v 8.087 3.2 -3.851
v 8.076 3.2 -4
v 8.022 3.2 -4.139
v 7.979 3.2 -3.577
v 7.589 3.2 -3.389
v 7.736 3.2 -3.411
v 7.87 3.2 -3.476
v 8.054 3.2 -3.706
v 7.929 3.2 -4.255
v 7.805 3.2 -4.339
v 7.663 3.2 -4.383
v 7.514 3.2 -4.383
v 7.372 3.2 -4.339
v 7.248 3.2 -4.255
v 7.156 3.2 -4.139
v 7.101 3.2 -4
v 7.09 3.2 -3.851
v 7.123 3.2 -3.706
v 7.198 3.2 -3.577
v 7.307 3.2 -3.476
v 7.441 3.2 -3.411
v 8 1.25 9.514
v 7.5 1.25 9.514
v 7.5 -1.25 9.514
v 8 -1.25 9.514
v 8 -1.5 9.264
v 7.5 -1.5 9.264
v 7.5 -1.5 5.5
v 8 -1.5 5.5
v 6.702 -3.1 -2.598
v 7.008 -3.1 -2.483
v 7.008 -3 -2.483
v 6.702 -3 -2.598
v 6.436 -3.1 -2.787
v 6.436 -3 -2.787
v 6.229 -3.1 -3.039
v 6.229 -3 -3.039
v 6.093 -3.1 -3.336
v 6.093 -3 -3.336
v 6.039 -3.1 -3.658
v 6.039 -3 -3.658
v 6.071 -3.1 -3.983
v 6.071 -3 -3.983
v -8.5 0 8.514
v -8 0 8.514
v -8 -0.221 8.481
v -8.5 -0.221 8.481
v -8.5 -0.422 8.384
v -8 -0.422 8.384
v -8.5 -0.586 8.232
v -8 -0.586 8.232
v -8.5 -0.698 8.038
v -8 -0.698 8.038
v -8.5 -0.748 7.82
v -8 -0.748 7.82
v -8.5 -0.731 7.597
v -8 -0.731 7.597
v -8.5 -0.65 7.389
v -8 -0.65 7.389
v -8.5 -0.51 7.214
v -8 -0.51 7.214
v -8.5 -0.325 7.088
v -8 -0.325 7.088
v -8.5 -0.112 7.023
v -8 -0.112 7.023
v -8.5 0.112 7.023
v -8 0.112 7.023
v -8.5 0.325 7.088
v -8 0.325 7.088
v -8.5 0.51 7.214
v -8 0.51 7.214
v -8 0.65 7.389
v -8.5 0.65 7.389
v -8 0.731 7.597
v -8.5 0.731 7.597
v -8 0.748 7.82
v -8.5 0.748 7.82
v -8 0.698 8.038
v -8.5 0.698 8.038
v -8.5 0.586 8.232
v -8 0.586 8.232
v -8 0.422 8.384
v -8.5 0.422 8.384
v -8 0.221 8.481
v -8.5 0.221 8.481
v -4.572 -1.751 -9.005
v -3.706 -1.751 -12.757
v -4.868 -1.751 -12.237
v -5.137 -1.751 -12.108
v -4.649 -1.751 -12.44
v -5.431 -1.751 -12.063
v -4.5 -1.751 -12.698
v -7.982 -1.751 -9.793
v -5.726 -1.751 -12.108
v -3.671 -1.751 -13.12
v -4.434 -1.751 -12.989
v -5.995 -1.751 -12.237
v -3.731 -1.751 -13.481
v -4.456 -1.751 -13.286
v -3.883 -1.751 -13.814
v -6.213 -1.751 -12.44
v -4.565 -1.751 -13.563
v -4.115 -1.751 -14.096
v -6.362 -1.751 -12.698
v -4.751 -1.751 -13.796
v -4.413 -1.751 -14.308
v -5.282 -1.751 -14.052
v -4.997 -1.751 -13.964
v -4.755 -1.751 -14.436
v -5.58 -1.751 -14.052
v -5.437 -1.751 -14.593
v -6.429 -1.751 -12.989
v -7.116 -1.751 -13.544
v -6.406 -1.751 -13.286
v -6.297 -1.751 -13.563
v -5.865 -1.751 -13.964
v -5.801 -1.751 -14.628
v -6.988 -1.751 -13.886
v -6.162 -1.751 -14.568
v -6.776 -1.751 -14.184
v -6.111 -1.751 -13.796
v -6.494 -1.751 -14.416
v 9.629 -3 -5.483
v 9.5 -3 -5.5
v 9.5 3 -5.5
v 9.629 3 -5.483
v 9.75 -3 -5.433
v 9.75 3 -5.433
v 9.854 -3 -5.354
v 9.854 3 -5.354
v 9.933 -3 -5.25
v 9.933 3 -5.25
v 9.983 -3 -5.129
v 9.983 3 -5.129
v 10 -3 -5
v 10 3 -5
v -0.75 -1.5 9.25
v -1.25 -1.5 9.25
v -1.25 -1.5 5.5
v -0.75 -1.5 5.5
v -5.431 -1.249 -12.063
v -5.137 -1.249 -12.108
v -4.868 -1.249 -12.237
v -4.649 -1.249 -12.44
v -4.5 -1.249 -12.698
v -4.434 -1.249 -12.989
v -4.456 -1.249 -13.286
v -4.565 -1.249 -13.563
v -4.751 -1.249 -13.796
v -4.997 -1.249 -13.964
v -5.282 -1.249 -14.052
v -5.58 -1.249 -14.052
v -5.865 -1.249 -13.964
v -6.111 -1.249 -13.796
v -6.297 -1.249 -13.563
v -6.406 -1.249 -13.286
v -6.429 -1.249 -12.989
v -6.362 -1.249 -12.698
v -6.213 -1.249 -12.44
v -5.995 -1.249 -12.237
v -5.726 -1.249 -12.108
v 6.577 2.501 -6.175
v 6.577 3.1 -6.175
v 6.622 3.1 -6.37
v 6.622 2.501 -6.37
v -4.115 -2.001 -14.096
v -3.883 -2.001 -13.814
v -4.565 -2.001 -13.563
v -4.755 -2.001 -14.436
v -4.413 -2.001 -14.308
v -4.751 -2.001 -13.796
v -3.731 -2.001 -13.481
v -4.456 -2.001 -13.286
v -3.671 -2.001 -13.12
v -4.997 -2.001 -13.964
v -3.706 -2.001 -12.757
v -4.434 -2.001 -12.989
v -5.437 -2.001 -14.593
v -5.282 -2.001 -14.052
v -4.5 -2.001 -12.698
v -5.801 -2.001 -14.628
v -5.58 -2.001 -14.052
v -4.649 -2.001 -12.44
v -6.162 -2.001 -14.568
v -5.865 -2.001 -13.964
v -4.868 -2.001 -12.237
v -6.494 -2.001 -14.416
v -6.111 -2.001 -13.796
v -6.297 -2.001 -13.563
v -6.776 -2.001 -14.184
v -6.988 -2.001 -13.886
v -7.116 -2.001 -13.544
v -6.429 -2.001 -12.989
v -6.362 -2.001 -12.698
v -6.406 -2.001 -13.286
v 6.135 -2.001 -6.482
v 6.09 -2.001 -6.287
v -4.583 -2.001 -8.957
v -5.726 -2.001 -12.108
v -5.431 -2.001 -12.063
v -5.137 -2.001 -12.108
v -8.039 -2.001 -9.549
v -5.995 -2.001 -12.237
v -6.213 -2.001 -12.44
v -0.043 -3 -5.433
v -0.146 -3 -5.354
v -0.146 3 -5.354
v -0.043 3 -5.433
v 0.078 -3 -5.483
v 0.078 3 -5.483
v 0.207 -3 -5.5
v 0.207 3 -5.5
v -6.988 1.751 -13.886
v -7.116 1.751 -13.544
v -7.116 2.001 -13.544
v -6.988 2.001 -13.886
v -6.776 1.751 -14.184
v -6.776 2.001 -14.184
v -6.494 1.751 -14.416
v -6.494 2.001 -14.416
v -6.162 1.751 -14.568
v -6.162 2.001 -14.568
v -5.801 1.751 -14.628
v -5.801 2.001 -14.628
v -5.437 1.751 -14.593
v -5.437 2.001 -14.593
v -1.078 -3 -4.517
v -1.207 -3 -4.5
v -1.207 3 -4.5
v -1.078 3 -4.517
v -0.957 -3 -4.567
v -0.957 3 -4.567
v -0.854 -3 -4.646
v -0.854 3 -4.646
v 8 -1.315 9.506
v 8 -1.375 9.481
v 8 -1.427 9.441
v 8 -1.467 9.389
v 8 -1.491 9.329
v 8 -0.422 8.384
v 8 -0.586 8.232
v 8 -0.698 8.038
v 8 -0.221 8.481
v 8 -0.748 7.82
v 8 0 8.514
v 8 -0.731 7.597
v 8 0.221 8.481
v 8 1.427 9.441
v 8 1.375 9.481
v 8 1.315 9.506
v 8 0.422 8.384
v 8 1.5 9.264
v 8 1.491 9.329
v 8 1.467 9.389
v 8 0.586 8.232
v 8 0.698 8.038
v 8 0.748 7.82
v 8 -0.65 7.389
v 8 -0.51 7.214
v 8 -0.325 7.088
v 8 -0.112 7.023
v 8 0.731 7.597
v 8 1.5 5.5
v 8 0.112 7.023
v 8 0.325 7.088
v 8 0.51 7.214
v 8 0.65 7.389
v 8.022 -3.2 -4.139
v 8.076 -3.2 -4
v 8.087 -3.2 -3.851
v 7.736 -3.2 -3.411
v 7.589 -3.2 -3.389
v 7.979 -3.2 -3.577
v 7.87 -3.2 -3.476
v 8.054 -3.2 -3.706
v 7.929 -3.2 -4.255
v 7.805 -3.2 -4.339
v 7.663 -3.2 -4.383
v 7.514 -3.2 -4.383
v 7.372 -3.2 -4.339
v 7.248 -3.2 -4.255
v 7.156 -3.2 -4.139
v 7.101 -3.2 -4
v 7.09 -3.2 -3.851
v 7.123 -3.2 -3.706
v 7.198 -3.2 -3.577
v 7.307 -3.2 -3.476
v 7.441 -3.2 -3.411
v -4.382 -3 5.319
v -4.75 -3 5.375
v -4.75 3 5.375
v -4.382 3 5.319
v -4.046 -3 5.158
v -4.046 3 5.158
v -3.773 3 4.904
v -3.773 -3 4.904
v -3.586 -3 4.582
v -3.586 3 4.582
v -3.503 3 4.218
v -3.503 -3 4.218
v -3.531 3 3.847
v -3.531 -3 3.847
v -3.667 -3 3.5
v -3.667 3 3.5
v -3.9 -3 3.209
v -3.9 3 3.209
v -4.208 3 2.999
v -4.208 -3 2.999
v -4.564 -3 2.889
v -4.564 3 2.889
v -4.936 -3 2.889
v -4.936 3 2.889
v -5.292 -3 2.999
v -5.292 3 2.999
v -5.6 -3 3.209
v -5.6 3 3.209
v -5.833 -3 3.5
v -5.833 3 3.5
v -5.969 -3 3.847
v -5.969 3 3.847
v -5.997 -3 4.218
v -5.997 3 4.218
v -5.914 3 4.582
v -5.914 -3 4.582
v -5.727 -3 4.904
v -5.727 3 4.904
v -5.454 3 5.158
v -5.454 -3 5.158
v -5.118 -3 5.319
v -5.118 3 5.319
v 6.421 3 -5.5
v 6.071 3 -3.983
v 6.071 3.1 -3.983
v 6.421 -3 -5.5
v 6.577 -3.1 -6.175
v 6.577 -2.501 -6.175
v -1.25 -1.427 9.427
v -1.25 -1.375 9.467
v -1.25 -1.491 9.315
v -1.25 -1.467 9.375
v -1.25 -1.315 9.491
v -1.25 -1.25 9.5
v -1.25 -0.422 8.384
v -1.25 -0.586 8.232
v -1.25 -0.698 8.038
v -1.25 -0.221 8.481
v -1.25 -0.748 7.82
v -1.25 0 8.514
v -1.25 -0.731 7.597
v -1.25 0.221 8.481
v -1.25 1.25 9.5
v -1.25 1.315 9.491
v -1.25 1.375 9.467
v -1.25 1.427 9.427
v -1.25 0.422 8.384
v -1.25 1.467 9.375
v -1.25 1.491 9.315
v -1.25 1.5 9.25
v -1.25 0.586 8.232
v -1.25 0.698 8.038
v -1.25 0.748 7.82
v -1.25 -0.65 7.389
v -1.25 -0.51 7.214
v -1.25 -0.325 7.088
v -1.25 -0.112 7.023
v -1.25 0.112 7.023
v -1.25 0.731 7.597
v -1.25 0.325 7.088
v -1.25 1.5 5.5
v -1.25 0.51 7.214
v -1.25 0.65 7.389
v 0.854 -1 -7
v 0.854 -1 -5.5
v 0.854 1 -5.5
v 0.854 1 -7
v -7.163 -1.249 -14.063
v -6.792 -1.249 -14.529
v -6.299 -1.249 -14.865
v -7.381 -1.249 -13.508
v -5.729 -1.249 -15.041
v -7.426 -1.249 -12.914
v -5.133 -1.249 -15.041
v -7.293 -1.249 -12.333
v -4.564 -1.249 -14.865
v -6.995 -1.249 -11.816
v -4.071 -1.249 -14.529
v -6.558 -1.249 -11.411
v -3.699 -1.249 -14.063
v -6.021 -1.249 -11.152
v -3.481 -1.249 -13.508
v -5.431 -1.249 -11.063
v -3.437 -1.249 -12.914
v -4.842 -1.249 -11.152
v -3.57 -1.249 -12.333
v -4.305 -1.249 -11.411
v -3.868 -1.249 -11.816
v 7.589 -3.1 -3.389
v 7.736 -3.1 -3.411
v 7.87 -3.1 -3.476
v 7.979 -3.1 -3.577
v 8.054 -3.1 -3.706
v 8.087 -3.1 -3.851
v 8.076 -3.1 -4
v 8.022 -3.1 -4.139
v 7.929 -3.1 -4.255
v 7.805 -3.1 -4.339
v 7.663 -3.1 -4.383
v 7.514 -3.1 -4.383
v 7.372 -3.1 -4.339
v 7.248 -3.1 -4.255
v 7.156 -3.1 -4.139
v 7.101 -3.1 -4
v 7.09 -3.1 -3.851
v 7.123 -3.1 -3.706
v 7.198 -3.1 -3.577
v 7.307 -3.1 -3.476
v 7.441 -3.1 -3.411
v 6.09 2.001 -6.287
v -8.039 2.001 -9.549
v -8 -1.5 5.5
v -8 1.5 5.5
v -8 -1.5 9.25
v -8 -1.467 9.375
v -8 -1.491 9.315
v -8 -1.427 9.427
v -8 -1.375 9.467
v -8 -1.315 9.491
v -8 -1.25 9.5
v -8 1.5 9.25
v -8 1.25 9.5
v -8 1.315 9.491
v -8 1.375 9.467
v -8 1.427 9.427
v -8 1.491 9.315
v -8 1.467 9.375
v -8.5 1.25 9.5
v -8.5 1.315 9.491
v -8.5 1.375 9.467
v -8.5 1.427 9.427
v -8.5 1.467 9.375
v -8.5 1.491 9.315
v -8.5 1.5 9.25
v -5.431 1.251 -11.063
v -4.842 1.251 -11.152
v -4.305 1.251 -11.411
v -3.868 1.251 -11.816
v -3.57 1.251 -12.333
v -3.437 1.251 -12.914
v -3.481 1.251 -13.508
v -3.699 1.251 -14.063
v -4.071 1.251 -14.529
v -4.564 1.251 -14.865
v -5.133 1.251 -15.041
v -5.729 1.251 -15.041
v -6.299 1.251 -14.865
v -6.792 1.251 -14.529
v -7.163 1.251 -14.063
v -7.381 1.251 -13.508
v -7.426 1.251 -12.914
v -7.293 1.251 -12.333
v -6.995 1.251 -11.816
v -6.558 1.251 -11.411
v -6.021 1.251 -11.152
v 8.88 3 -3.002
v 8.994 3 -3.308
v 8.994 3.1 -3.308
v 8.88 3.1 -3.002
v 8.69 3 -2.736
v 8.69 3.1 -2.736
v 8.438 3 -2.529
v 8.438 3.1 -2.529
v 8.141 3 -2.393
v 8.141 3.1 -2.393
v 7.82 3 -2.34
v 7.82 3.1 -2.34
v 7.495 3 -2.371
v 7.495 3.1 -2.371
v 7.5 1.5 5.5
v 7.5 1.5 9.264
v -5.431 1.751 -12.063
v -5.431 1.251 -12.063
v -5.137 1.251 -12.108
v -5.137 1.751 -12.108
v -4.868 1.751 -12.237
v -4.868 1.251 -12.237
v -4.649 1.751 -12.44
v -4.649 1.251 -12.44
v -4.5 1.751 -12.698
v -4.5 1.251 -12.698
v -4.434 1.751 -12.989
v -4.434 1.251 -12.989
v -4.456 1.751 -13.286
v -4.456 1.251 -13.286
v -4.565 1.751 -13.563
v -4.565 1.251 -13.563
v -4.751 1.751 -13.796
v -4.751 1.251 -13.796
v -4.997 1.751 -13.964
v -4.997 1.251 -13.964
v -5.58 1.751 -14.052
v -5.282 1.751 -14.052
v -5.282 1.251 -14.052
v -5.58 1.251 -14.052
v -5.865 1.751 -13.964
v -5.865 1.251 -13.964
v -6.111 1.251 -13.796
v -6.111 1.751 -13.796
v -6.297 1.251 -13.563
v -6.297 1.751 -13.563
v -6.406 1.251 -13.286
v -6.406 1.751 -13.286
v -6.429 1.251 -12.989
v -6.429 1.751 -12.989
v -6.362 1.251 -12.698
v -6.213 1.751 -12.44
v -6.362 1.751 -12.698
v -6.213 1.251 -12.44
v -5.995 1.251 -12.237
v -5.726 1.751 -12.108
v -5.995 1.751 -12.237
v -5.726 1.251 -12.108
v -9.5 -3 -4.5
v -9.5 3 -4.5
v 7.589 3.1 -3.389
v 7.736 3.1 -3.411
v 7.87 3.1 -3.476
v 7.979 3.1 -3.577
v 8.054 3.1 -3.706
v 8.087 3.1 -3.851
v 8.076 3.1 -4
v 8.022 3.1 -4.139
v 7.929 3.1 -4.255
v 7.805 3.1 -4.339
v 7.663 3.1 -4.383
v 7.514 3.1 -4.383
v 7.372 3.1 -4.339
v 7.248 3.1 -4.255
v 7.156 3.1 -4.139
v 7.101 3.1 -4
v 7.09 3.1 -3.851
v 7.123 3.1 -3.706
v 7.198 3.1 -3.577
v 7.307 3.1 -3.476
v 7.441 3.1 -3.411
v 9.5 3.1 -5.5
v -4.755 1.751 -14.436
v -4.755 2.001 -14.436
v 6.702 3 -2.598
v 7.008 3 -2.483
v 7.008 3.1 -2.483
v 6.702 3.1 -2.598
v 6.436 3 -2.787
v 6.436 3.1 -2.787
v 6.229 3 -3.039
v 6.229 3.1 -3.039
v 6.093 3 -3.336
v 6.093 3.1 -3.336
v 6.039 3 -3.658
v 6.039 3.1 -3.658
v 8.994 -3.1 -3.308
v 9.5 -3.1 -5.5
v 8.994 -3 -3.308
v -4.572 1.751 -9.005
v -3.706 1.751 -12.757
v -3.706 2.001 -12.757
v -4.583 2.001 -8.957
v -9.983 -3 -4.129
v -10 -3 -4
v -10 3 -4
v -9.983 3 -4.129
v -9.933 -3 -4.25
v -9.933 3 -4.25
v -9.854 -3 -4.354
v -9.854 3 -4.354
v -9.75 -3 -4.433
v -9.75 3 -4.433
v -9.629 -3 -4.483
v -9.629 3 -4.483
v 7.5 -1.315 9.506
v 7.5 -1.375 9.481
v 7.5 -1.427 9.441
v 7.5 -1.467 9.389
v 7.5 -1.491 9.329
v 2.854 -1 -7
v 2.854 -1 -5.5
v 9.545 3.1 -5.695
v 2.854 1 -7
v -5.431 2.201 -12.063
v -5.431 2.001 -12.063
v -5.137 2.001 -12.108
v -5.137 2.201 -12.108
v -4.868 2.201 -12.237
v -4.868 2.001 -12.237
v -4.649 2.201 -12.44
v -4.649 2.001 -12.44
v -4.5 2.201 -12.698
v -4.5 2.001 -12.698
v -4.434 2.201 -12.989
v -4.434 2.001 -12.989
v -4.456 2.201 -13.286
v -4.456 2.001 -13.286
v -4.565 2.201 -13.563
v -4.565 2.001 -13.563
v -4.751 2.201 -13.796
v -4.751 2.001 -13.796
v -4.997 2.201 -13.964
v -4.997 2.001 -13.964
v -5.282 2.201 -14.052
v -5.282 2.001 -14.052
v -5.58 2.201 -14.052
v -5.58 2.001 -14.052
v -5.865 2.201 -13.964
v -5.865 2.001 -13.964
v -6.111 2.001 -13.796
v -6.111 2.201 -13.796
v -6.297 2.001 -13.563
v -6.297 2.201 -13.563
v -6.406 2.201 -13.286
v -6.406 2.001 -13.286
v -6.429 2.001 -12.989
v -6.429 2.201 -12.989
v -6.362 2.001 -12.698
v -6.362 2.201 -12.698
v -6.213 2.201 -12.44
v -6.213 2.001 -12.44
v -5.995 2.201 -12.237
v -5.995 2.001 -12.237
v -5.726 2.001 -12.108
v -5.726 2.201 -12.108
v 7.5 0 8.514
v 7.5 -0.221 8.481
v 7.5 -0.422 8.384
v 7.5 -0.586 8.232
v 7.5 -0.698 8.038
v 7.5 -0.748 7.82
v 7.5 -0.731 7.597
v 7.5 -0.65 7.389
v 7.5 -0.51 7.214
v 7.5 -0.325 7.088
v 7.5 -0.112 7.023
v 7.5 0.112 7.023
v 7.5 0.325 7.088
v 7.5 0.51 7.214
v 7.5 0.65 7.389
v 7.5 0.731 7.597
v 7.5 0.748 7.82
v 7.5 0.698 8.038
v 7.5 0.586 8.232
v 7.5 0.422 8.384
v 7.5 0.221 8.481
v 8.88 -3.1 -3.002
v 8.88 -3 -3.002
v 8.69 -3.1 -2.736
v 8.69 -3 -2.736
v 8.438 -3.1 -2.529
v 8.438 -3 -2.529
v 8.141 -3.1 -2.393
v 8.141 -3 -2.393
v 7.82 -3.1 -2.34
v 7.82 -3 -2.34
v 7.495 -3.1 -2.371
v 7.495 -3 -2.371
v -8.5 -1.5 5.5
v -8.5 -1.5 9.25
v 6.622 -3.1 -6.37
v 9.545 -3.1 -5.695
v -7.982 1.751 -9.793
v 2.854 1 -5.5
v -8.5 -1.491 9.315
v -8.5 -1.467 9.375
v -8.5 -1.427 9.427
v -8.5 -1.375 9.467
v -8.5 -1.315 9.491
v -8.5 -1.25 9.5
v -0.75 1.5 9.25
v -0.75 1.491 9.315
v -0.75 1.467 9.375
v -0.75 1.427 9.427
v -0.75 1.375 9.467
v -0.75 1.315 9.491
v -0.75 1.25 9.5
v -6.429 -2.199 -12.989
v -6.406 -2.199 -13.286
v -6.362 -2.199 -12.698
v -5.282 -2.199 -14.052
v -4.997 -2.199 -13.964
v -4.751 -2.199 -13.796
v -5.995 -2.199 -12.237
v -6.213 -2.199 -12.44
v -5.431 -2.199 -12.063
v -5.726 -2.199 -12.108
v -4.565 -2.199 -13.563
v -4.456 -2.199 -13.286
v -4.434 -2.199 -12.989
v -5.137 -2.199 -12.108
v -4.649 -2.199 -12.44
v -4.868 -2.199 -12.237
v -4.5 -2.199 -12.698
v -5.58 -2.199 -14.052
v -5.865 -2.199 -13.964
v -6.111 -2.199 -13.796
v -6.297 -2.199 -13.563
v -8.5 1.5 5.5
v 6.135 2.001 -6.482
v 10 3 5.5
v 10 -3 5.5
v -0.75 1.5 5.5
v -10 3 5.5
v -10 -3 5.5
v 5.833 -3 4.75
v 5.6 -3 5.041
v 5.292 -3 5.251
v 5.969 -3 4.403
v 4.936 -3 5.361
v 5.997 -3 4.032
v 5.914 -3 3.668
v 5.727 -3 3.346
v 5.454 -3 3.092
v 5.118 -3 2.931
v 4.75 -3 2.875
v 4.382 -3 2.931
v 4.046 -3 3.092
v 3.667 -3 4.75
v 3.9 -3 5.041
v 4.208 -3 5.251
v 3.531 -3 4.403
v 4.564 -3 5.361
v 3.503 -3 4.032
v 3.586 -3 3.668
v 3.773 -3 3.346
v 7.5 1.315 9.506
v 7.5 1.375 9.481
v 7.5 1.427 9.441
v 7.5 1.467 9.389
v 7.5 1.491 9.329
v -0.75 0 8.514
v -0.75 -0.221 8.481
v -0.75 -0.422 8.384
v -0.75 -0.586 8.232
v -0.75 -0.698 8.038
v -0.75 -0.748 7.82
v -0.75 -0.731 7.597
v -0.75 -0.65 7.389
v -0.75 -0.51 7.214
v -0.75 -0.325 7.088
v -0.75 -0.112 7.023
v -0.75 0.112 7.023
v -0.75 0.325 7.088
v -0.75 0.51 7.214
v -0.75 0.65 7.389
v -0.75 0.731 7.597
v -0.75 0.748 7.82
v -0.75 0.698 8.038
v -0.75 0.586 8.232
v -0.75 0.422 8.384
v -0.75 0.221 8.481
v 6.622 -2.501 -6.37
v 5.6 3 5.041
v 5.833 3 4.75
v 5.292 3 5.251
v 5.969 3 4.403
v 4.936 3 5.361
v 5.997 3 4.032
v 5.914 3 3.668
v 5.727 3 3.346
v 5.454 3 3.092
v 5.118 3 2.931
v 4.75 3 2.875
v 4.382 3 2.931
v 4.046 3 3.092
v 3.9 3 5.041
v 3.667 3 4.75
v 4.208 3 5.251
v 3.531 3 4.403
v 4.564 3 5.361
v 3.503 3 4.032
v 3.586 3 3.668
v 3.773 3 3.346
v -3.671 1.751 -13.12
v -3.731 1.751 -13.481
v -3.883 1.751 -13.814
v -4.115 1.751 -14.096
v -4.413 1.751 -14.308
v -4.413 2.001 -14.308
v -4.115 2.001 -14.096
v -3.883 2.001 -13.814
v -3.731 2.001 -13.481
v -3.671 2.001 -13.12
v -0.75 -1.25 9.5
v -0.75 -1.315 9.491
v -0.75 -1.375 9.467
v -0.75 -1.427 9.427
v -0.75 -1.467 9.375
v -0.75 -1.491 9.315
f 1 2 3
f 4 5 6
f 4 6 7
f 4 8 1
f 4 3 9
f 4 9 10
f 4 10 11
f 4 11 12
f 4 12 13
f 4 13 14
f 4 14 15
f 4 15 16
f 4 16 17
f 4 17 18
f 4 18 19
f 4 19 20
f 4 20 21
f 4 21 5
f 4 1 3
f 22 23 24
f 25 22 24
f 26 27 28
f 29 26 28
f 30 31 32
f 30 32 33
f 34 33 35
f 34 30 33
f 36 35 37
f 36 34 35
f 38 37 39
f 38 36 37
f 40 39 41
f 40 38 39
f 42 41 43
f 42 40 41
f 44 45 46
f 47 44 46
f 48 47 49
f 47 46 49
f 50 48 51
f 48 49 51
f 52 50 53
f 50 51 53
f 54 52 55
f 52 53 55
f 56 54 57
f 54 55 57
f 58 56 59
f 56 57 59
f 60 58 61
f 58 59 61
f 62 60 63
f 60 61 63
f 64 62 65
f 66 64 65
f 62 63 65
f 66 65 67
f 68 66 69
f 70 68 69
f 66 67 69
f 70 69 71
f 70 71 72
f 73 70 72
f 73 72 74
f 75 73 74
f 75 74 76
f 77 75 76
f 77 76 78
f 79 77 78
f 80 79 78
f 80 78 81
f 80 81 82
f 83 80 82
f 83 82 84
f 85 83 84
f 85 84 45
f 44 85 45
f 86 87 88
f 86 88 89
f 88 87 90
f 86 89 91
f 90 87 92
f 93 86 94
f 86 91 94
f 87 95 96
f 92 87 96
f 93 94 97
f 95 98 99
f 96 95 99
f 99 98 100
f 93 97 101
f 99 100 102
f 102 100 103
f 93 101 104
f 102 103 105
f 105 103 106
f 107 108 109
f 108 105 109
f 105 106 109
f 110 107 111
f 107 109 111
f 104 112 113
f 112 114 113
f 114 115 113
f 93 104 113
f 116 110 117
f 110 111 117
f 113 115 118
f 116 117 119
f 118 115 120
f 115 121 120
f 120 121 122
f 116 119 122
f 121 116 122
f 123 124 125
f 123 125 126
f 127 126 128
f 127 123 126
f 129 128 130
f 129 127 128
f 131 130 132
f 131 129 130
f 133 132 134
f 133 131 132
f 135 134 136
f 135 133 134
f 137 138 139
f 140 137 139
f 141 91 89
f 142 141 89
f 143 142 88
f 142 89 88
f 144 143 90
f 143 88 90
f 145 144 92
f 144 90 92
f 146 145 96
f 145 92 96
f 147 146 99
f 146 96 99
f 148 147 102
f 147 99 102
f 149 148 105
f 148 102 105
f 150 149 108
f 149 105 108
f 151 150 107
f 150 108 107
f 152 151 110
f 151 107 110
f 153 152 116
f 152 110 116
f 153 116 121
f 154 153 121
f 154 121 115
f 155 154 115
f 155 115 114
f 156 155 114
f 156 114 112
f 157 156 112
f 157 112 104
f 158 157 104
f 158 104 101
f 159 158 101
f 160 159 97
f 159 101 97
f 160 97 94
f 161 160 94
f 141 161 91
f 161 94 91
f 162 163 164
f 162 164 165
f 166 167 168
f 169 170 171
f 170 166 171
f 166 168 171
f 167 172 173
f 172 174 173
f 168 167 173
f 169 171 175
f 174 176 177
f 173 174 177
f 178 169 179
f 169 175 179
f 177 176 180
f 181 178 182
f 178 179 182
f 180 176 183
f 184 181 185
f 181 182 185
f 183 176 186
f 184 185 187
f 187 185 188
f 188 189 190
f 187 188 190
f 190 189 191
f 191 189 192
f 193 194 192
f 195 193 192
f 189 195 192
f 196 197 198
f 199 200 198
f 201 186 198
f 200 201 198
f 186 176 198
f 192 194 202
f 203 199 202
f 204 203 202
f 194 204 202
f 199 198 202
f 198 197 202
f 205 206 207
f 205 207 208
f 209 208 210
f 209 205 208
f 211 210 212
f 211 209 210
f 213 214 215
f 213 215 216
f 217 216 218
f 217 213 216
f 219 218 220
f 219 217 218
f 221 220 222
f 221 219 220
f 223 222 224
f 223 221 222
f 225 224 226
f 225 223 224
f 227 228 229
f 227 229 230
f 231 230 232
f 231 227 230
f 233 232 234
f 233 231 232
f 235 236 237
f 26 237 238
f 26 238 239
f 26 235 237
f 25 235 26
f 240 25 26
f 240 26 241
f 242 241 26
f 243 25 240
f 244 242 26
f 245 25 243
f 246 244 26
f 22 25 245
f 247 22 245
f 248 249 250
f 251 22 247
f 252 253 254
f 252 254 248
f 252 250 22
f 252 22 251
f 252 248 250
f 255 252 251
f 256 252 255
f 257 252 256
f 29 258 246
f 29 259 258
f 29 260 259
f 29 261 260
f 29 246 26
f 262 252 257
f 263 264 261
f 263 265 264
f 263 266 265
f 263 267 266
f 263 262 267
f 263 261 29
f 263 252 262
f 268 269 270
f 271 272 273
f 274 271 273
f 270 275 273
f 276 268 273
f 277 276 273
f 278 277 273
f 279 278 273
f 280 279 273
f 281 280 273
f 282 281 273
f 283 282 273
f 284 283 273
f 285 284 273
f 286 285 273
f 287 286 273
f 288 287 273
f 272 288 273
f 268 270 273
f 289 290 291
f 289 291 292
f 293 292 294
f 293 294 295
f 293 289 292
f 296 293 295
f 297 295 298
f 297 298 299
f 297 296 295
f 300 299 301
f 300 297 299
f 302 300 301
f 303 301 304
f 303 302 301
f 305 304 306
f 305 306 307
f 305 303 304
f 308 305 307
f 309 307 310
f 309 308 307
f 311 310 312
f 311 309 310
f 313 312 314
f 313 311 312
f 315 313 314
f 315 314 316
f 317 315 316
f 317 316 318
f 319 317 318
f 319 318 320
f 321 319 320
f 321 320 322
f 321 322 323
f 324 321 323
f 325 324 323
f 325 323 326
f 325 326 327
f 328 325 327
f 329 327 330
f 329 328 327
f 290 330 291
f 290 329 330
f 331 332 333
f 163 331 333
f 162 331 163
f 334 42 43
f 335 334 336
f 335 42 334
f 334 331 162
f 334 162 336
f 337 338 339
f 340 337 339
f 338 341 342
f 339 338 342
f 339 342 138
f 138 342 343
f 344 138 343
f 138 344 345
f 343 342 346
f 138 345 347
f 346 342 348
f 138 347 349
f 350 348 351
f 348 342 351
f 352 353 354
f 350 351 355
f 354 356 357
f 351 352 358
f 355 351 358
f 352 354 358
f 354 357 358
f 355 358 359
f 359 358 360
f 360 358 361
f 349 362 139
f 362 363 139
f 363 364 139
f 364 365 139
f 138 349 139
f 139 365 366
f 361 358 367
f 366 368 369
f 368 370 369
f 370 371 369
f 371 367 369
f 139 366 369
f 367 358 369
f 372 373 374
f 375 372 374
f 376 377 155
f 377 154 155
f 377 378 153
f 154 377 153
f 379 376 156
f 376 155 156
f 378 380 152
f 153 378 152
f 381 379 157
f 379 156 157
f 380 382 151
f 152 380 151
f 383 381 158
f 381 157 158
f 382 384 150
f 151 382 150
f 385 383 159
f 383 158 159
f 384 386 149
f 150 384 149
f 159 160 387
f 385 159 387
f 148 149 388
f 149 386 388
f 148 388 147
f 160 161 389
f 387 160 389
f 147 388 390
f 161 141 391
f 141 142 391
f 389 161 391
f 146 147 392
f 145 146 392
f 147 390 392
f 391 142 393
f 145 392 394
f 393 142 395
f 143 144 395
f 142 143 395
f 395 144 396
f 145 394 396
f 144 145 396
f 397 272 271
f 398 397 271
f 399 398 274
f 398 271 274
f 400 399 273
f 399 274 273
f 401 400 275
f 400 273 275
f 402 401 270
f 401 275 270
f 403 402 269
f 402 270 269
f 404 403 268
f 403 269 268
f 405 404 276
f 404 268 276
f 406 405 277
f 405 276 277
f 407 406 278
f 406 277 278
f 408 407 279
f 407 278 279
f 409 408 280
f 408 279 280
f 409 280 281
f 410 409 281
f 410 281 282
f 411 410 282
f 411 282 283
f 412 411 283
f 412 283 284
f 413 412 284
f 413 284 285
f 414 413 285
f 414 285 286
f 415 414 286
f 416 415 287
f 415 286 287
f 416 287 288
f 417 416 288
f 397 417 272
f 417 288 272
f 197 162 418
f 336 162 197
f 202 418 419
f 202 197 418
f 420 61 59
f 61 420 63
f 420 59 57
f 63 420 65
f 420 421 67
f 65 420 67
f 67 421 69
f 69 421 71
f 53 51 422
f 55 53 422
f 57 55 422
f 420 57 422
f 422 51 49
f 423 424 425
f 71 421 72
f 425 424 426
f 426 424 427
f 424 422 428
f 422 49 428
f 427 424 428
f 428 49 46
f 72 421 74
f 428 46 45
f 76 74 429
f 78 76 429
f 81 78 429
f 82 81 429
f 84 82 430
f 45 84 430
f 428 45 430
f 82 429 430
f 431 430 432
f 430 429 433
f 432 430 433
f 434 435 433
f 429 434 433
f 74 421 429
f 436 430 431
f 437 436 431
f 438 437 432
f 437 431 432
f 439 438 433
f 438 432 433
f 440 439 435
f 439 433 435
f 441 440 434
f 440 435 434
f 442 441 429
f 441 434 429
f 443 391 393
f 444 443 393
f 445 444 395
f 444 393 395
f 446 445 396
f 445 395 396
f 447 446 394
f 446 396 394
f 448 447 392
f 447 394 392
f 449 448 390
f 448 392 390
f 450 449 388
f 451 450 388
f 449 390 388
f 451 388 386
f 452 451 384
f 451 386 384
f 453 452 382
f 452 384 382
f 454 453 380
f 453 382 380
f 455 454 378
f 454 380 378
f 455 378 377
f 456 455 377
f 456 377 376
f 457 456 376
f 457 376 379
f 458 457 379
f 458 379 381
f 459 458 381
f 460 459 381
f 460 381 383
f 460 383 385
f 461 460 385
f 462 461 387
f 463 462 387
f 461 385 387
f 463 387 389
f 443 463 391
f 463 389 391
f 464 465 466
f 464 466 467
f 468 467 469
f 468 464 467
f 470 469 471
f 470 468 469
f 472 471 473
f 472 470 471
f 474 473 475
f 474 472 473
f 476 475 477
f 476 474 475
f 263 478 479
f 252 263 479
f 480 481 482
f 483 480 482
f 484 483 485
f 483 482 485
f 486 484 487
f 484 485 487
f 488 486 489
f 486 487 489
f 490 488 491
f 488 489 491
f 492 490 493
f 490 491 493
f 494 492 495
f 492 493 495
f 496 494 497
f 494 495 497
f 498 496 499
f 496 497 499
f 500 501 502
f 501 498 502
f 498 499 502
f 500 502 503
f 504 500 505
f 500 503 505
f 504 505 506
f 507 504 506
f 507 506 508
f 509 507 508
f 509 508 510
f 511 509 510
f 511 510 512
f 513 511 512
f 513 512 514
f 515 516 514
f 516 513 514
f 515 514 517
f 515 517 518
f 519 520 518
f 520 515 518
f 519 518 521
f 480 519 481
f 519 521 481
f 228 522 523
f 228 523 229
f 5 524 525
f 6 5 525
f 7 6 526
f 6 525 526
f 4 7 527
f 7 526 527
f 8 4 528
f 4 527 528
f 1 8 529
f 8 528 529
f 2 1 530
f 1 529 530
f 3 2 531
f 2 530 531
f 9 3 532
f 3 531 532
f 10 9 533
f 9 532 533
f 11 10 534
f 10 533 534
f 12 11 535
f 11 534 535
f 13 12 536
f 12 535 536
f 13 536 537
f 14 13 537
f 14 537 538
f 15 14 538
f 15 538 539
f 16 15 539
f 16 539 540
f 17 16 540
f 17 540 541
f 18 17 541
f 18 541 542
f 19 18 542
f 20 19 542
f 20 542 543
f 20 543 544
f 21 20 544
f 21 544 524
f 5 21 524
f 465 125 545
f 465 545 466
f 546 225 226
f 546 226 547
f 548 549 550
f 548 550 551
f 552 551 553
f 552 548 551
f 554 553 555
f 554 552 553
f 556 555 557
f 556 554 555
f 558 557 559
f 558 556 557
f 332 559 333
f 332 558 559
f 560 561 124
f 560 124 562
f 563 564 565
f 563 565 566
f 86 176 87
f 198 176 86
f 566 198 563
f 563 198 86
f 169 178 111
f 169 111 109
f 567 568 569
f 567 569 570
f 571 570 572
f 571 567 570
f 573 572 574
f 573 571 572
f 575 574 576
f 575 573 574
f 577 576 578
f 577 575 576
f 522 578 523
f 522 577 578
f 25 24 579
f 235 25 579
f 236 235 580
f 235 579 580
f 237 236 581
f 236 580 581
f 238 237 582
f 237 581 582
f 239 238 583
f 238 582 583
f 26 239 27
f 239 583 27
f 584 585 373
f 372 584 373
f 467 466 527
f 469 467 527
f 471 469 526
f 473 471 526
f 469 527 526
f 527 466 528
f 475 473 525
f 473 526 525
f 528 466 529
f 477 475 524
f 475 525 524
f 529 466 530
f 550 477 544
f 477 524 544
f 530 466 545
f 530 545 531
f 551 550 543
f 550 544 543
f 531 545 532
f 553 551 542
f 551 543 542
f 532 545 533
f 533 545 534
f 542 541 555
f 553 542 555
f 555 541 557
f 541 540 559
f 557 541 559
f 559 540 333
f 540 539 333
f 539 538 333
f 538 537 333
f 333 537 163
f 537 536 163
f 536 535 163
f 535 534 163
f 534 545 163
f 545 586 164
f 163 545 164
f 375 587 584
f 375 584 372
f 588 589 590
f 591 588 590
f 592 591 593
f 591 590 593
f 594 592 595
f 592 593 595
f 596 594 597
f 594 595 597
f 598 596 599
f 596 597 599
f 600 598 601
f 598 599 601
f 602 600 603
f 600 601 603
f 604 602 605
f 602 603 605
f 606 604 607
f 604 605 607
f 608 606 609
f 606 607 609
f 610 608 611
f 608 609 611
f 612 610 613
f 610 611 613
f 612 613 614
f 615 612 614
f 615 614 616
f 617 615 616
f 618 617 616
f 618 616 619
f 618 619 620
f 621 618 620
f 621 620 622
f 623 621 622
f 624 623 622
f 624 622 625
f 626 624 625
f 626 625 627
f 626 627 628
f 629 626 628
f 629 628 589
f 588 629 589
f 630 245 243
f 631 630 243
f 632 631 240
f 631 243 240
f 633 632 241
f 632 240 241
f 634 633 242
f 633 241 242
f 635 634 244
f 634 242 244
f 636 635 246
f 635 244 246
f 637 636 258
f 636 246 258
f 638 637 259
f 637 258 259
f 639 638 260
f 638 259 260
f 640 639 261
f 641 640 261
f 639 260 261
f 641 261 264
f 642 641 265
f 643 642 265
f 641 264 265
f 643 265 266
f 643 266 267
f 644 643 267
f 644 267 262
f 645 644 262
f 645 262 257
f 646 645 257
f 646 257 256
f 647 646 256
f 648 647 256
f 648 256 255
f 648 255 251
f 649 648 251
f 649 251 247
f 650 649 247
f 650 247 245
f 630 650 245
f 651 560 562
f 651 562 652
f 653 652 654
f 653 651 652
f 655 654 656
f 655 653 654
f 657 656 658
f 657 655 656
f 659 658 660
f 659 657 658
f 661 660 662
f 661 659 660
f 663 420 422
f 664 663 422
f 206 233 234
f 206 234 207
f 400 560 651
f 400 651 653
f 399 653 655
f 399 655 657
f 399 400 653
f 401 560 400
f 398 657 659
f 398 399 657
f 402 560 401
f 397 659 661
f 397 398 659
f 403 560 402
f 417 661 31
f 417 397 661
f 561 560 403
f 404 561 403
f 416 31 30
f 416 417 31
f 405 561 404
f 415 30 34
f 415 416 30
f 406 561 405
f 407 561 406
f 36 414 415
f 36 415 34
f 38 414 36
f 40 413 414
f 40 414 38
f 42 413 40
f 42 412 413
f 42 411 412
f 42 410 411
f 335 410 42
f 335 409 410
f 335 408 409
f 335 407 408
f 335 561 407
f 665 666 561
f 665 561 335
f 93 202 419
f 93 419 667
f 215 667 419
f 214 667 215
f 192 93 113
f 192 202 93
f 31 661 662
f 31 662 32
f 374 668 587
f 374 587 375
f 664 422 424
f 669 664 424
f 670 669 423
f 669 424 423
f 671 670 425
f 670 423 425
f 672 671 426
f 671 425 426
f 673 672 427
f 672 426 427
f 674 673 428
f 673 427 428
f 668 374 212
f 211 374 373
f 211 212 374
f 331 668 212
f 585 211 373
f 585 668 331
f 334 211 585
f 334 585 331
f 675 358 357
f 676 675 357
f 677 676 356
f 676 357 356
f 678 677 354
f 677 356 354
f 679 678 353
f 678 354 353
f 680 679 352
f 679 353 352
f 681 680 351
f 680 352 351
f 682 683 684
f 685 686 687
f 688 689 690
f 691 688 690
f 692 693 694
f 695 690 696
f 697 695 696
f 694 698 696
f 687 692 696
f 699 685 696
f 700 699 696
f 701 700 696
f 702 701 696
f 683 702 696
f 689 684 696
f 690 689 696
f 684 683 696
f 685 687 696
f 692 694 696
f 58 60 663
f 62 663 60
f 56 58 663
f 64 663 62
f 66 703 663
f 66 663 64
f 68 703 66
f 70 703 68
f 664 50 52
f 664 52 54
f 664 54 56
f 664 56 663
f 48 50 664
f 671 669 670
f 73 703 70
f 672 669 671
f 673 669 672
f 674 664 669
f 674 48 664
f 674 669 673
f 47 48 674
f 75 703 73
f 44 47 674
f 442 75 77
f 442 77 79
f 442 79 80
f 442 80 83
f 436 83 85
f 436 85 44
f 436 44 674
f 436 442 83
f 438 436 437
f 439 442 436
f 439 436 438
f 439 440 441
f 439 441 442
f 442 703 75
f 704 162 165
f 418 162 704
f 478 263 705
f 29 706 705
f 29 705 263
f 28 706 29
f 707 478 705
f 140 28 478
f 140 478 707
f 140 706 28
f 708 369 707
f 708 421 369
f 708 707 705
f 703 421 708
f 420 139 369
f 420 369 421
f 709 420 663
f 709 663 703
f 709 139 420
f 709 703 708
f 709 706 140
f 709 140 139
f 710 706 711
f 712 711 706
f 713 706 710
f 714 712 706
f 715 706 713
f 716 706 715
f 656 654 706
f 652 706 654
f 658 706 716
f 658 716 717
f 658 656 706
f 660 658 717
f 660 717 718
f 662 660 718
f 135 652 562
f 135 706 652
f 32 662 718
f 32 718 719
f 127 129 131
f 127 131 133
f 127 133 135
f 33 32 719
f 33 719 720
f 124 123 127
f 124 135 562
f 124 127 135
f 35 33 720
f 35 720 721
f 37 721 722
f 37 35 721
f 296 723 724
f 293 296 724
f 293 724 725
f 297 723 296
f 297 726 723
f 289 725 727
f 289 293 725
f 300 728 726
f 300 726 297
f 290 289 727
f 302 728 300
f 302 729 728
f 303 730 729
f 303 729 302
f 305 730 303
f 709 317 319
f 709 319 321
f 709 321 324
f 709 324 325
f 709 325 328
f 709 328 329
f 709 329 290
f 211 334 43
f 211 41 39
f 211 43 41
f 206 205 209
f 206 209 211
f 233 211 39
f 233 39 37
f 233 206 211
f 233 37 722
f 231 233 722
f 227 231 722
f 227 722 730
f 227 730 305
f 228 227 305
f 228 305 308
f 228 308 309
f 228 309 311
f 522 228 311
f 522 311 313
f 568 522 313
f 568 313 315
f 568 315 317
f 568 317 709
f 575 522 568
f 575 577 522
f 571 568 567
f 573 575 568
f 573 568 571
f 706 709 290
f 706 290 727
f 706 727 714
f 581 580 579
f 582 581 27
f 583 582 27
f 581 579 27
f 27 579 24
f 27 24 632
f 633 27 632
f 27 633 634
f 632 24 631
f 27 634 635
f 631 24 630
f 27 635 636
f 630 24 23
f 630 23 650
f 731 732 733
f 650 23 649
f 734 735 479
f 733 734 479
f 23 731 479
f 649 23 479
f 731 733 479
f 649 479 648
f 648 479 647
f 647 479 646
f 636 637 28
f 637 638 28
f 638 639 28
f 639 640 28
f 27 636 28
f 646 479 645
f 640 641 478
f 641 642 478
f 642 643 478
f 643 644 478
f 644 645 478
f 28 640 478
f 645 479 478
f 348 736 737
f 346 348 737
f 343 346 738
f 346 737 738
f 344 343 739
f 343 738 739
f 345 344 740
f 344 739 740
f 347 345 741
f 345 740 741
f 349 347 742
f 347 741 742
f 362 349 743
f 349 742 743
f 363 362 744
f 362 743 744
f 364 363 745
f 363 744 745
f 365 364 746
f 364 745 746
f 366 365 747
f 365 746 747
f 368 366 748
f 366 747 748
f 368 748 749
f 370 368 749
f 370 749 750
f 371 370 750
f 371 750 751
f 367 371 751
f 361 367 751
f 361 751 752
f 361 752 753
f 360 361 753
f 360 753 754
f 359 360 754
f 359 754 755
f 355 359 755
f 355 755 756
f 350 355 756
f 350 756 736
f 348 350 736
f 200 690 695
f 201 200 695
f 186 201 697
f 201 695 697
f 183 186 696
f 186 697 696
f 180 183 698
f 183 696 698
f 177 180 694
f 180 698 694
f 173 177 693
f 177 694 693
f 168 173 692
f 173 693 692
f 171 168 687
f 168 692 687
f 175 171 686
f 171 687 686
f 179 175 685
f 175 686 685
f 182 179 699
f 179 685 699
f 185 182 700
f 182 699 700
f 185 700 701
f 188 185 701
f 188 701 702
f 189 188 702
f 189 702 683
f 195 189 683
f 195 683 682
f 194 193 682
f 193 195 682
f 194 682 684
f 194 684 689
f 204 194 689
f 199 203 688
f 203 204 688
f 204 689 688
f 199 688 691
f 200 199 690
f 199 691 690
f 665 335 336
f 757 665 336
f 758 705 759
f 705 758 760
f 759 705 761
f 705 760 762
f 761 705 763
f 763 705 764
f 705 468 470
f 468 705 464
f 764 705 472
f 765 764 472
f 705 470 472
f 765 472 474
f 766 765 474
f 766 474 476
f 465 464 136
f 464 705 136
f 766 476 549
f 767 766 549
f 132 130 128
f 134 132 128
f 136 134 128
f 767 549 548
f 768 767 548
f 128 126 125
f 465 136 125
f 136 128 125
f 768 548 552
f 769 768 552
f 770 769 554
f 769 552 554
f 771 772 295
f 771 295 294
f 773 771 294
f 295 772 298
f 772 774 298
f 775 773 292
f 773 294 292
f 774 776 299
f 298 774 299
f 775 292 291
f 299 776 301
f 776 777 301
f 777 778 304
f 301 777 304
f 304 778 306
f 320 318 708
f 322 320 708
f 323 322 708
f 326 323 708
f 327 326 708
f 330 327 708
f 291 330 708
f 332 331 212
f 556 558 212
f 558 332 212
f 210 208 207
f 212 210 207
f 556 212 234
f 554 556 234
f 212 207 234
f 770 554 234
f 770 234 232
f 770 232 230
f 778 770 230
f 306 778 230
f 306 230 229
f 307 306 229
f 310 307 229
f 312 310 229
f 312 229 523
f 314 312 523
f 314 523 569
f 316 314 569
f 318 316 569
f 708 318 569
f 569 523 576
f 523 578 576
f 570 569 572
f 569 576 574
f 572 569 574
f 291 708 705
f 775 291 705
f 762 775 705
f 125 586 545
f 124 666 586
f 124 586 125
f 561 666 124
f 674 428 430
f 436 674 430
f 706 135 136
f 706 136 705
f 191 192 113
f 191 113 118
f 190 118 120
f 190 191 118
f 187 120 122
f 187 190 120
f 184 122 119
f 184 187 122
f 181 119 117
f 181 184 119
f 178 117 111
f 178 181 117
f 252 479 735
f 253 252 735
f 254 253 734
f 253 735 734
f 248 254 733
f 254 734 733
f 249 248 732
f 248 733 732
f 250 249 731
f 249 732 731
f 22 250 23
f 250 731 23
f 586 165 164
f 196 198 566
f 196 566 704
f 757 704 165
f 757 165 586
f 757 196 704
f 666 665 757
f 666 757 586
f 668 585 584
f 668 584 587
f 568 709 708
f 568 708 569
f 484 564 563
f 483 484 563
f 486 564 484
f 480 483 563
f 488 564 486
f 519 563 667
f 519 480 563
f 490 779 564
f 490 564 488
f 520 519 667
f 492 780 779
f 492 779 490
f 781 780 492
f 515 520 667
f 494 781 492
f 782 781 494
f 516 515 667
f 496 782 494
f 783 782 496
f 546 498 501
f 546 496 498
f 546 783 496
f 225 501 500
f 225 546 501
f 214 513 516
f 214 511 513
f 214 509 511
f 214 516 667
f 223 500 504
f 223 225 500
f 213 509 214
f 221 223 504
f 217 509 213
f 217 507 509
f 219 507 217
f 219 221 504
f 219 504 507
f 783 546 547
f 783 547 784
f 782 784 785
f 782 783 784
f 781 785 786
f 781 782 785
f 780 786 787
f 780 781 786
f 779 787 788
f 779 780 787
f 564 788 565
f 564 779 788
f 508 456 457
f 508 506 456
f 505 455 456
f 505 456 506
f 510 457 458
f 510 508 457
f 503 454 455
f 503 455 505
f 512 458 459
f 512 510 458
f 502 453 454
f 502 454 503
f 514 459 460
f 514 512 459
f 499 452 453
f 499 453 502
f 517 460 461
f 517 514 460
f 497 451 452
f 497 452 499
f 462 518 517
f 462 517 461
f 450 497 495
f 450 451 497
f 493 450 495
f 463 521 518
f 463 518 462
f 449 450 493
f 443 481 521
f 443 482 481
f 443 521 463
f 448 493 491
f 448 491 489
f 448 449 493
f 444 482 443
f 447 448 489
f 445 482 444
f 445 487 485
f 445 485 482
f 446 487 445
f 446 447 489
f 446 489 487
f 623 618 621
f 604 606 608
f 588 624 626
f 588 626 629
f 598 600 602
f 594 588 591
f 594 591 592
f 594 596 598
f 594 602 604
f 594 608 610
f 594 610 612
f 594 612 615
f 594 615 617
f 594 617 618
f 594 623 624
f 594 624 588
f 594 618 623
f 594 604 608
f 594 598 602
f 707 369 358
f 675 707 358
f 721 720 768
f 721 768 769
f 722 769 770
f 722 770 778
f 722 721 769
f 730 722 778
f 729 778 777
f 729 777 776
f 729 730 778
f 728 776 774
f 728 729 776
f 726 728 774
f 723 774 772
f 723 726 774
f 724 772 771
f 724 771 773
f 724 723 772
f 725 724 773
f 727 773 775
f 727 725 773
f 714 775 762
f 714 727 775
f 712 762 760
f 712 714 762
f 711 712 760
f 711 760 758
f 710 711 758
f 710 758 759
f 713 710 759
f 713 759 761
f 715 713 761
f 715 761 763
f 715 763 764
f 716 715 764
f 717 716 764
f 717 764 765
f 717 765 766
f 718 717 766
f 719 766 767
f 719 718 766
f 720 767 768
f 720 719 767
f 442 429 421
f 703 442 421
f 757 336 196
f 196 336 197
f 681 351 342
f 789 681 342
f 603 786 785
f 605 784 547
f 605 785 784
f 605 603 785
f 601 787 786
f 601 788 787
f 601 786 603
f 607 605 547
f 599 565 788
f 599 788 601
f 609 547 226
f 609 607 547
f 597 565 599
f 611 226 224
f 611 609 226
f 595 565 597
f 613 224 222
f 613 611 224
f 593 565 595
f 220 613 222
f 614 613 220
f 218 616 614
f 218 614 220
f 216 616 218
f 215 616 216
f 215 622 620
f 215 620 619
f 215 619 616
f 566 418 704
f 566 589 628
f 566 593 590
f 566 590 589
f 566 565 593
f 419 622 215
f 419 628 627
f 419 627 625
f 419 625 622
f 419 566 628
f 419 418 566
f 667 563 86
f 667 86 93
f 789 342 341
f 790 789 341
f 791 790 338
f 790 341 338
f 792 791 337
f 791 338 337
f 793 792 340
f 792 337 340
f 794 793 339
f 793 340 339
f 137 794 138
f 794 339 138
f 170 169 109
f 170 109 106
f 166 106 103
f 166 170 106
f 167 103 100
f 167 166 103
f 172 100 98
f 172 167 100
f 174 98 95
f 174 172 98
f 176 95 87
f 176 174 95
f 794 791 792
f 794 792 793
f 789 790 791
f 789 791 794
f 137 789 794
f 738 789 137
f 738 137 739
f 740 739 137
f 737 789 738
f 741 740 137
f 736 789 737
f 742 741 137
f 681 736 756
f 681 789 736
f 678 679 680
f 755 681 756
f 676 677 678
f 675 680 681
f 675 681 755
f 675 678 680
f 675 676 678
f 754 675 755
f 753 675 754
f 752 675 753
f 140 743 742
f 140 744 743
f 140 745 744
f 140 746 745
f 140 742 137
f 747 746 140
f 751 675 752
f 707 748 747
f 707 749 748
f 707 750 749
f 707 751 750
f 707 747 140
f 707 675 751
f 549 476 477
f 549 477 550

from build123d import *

# Parameters (mm, degrees)
Y_KSEKLIK_EKSTR_ZYON1_DEPTH       = 3
Y_KSEKLIK_EKSTR_ZYON1_DEPTH_BACK  = 3
IZIM1_R                           = 1.25
IZIM2_W                           = 2
IZIM2_H                           = 2
Y_KSEKLIK_EKSTR_ZYON2_DEPTH       = 1.5
Y_KSEKLIK_EKSTR_ZYON6_DEPTH       = 3.1
Y_KSEKLIK_EKSTR_ZYON6_DEPTH_BACK  = 3.1
KES_EKSTR_ZYON1_DEPTH             = 6
KES_EKSTR_ZYON1_DEPTH_BACK        = 0.5
IZIM5_W                           = 5
IZIM5_H                           = 3.50112481
KES_EKSTR_ZYON2_DEPTH             = 5.25
Y_KSEKLIK_EKSTR_ZYON7_DEPTH       = 1.25
Y_KSEKLIK_EKSTR_ZYON7_DEPTH_BACK  = 1.25
IZIM6_R                           = 2
Y_KSEKLIK_EKSTR_ZYON8_DEPTH       = 2.2
Y_KSEKLIK_EKSTR_ZYON8_DEPTH_BACK  = 2.2
IZIM7_R                           = 1
Y_KSEKLIK_EKSTR_ZYON9_DEPTH       = 0.25
Y_KSEKLIK_EKSTR_ZYON9_DEPTH_BACK  = 0.25
Y_KSEKLIK_EKSTR_ZYON10_DEPTH      = 0.25
Y_KSEKLIK_EKSTR_ZYON10_DEPTH_BACK = 0.25
Y_KSEKLIK_EKSTR_ZYON11_DEPTH      = 0.25
Y_KSEKLIK_EKSTR_ZYON11_DEPTH_BACK = 0.25
KES_EKSTR_ZYON3_REACH             = 25.675
IZIM11_R                          = 0.75
Y_KSEKLIK_EKSTR_ZYON13_DEPTH      = 3.2
Y_KSEKLIK_EKSTR_ZYON13_DEPTH_BACK = 3.2
IZIM13_R                          = 0.5


with BuildPart() as part:
    # Çizim1 → Yükseklik-Ekstrüzyon1 (new, two sides: drawn at the far end of the back side and taken through both)
    with BuildSketch(Plane(origin=(0, 0, 0), x_dir=(1, 0, 0), z_dir=(0, 1, 0)).offset(-Y_KSEKLIK_EKSTR_ZYON1_DEPTH_BACK)):
        with BuildLine():
            Line((0.207106781, 5.5), (9.5, 5.5))
            ThreePointArc((9.5, 5.5), (9.853553391, 5.353553391), (10, 5))
            Line((10, 5), (10, -5.5))
            Line((10, -5.5), (-10, -5.5))
            Line((-10, -5.5), (-10, 4))
            ThreePointArc((-10, 4), (-9.853553391, 4.353553391), (-9.5, 4.5))
            Line((-9.5, 4.5), (-1.207106781, 4.5))
            ThreePointArc((-1.207106781, 4.5), (-1.015765065, 4.538060234), (-0.853553391, 4.646446609))
            Line((-0.853553391, 4.646446609), (-0.146446609, 5.353553391))
            ThreePointArc((-0.146446609, 5.353553391), (0.015765065, 5.461939766), (0.207106781, 5.5))
        make_face()
        with Locations(Location((-4.75, -4.125, 0), (0, 0, 270))):
            Circle(IZIM1_R, mode=Mode.SUBTRACT)
        with Locations(Location((4.75, -4.125, 0), (0, 0, 90))):
            Circle(IZIM1_R, mode=Mode.SUBTRACT)
    extrude(amount=Y_KSEKLIK_EKSTR_ZYON1_DEPTH + Y_KSEKLIK_EKSTR_ZYON1_DEPTH_BACK)

    # Çizim2 → Yükseklik-Ekstrüzyon2 (add)
    with BuildSketch(Plane(origin=(0, 0, -5.5), x_dir=(-1, 0, 0), z_dir=(0, 0, -1))):
        with Locations((-1.853553391, 0)):
            Rectangle(IZIM2_W, IZIM2_H)
    extrude(amount=Y_KSEKLIK_EKSTR_ZYON2_DEPTH)

    # Çizim3 → Yükseklik-Ekstrüzyon6 (add, two sides: drawn at the far end of the back side and taken through both)
    with BuildSketch(Plane(origin=(0, 0, 0), x_dir=(1, 0, 0), z_dir=(0, 1, 0)).offset(-Y_KSEKLIK_EKSTR_ZYON6_DEPTH_BACK)):
        with BuildLine():
            Line((9.5, 5.5), (8.993860128, 3.307667354))
            ThreePointArc((8.993860128, 3.307667354), (8.438296627, 2.528796052), (7.494708729, 2.370893591))
            Line((7.494708729, 2.370893591), (7.007523696, 2.483369118))
            ThreePointArc((7.007523696, 2.483369118), (6.228652394, 3.038932619), (6.070749933, 3.982520517))
            Line((6.070749933, 3.982520517), (6.576889806, 6.174853163))
            Line((6.576889806, 6.174853163), (-8.038661166, 9.549118978))
            Line((-8.038661166, 9.549118978), (-7.116361843, 13.544036244))
            ThreePointArc((-7.116361843, 13.544036244), (-6.494130723, 14.416372102), (-5.437312277, 14.593222858))
            Line((-5.437312277, 14.593222858), (-4.755253231, 14.43575712))
            ThreePointArc((-4.755253231, 14.43575712), (-3.882917373, 13.813526), (-3.706066617, 12.756707554))
            Line((-3.706066617, 12.756707554), (-4.583375729, 8.956664301))
            Line((-4.583375729, 8.956664301), (9.544990211, 5.694874013))
            Line((9.544990211, 5.694874013), (9.5, 5.5))
        make_face()
    extrude(amount=Y_KSEKLIK_EKSTR_ZYON6_DEPTH + Y_KSEKLIK_EKSTR_ZYON6_DEPTH_BACK)

    # Çizim4 → Kes-Ekstrüzyon1 (cut, two sides: drawn at the far end of the back side and taken through both)
    with BuildSketch(Plane(origin=(1.731239145, 0, -7.498820588), x_dir=(-0.9743700647852337, 0, -0.2249510543438719), z_dir=(0.22495105434387186, 0, -0.9743700647852336)).offset(-KES_EKSTR_ZYON1_DEPTH_BACK)):
        Polygon((-5.019284817, 2.500562405), (-4.519284817, 2.000562405), (10.019957698, 2.000562405), (10.019957698, 3.1), (-5.019284817, 3.1), align=None)
        Polygon((-4.519284817, -2.000562405), (10.019957698, -2.000562405), (10.019957698, -3.1), (-5.019284817, -3.1), (-5.019284817, -2.500562405), align=None)
    extrude(amount=KES_EKSTR_ZYON1_DEPTH + KES_EKSTR_ZYON1_DEPTH_BACK, mode=Mode.SUBTRACT)

    # Çizim5 → Kes-Ekstrüzyon2 (cut)
    with BuildSketch(Plane(origin=(2.923479733, 0, -12.662981931), x_dir=(-0.9743700647852332, 0, -0.2249510543438736), z_dir=(0.2249510543438736, 0, -0.9743700647852332))):
        with Locations((8.230715183, 0)):
            Rectangle(IZIM5_W, IZIM5_H)
    extrude(amount=-KES_EKSTR_ZYON2_DEPTH, mode=Mode.SUBTRACT)



with BuildPart() as body_2:
    # Çizim6 → Yükseklik-Ekstrüzyon7 (new, two sides: drawn at the far end of the back side and taken through both)
    with BuildSketch(Plane(origin=(0, 0.000562405, 0), x_dir=(1, 0, 0), z_dir=(0, 1, 0)).offset(-Y_KSEKLIK_EKSTR_ZYON7_DEPTH_BACK)):
        with Locations(Location((-5.431324974, 13.063262696, 0), (0, 0, 270))):
            Circle(IZIM6_R)
    extrude(amount=Y_KSEKLIK_EKSTR_ZYON7_DEPTH + Y_KSEKLIK_EKSTR_ZYON7_DEPTH_BACK)


with BuildPart() as part_1:
    add(part.part)

    add(body_2.part)  # Yükseklik-Ekstrüzyon8 merges body 2
    # Çizim7 → Yükseklik-Ekstrüzyon8 (add, two sides: drawn at the far end of the back side and taken through both)
    with BuildSketch(Plane(origin=(0, 0.000562405, 0), x_dir=(1, 0, 0), z_dir=(0, 1, 0)).offset(-Y_KSEKLIK_EKSTR_ZYON8_DEPTH_BACK)):
        with Locations(Location((-5.431324974, 13.063262696, 0), (0, 0, 270))):
            Circle(IZIM7_R)
    extrude(amount=Y_KSEKLIK_EKSTR_ZYON8_DEPTH + Y_KSEKLIK_EKSTR_ZYON8_DEPTH_BACK)

    # Çizim8 → Yükseklik-Ekstrüzyon9 (add, two sides: drawn at the far end of the back side and taken through both)
    with BuildSketch(Plane.ZY.offset(8.25).offset(-Y_KSEKLIK_EKSTR_ZYON9_DEPTH_BACK)):
        with BuildLine():
            Line((5.5, 1.5), (5.5, -1.5))
            Line((5.5, -1.5), (9.25, -1.5))
            ThreePointArc((9.25, -1.5), (9.426776695, -1.426776695), (9.5, -1.25))
            Line((9.5, -1.25), (9.5, 1.25))
            ThreePointArc((9.5, 1.25), (9.426776695, 1.426776695), (9.25, 1.5))
            Line((9.25, 1.5), (5.5, 1.5))
        make_face()
    extrude(amount=Y_KSEKLIK_EKSTR_ZYON9_DEPTH + Y_KSEKLIK_EKSTR_ZYON9_DEPTH_BACK)

    # Çizim9 → Yükseklik-Ekstrüzyon10 (add, two sides: drawn at the far end of the back side and taken through both)
    with BuildSketch(Plane(origin=(7.75, 0, 0), x_dir=(0, 0, -1), z_dir=(1, 0, 0)).offset(-Y_KSEKLIK_EKSTR_ZYON10_DEPTH_BACK)):
        with BuildLine():
            Line((-5.5, 1.5), (-9.264217475, 1.5))
            ThreePointArc((-9.264217475, 1.5), (-9.44099417, 1.426776695), (-9.514217475, 1.25))
            Line((-9.514217475, 1.25), (-9.514217475, -1.25))
            ThreePointArc((-9.514217475, -1.25), (-9.44099417, -1.426776695), (-9.264217475, -1.5))
            Line((-9.264217475, -1.5), (-5.5, -1.5))
            Line((-5.5, -1.5), (-5.5, 1.5))
        make_face()
    extrude(amount=Y_KSEKLIK_EKSTR_ZYON10_DEPTH + Y_KSEKLIK_EKSTR_ZYON10_DEPTH_BACK)

    # Çizim10 → Yükseklik-Ekstrüzyon11 (add, two sides: drawn at the far end of the back side and taken through both)
    with BuildSketch(Plane(origin=(-1, 0, 0), x_dir=(0, 0, -1), z_dir=(1, 0, 0)).offset(-Y_KSEKLIK_EKSTR_ZYON11_DEPTH_BACK)):
        with BuildLine():
            Line((-5.5, 1.5), (-9.25, 1.5))
            ThreePointArc((-9.25, 1.5), (-9.426776695, 1.426776695), (-9.5, 1.25))
            Line((-9.5, 1.25), (-9.5, -1.25))
            ThreePointArc((-9.5, -1.25), (-9.426776695, -1.426776695), (-9.25, -1.5))
            Line((-9.25, -1.5), (-5.5, -1.5))
            Line((-5.5, -1.5), (-5.5, 1.5))
        make_face()
    extrude(amount=Y_KSEKLIK_EKSTR_ZYON11_DEPTH + Y_KSEKLIK_EKSTR_ZYON11_DEPTH_BACK)

    # Kes-Ekstrüzyon3: up to this face of the body (flat: up to its plane)
    kes_ekstr_zyon3_end = Plane(part_1.part.faces().sort_by_distance((-10, 0, 0.75))[0])
    # Çizim11 → Kes-Ekstrüzyon3 (cut, up to the picked face)
    with BuildSketch(Plane(origin=(8, 0, 0), x_dir=(0, 0, -1), z_dir=(1, 0, 0)), mode=Mode.PRIVATE) as kes_ekstr_zyon3_sk1:
        with Locations(Location((-7.764217475, 0, 0), (0, 0, 180))):
            Circle(IZIM11_R)
    kes_ekstr_zyon3_tool1 = split(extrude(kes_ekstr_zyon3_sk1.sketch, amount=-KES_EKSTR_ZYON3_REACH, mode=Mode.PRIVATE), bisect_by=kes_ekstr_zyon3_end, keep=Keep.BOTH, mode=Mode.PRIVATE)
    add(kes_ekstr_zyon3_tool1.solids().sort_by(Axis((8, 0, 7.764217), (-1, 0, 0)))[0], mode=Mode.SUBTRACT)

    # Çizim13 → Yükseklik-Ekstrüzyon13 (add, two sides: drawn at the far end of the back side and taken through both)
    with BuildSketch(Plane(origin=(0, 0, 0), x_dir=(1, 0, 0), z_dir=(0, 1, 0)).offset(-Y_KSEKLIK_EKSTR_ZYON13_DEPTH_BACK)):
        with Locations(Location((7.588542794, 3.888686452, 0), (0, 0, 270))):
            Circle(IZIM13_R)
    extrude(amount=Y_KSEKLIK_EKSTR_ZYON13_DEPTH + Y_KSEKLIK_EKSTR_ZYON13_DEPTH_BACK)


solid = part_1.part
